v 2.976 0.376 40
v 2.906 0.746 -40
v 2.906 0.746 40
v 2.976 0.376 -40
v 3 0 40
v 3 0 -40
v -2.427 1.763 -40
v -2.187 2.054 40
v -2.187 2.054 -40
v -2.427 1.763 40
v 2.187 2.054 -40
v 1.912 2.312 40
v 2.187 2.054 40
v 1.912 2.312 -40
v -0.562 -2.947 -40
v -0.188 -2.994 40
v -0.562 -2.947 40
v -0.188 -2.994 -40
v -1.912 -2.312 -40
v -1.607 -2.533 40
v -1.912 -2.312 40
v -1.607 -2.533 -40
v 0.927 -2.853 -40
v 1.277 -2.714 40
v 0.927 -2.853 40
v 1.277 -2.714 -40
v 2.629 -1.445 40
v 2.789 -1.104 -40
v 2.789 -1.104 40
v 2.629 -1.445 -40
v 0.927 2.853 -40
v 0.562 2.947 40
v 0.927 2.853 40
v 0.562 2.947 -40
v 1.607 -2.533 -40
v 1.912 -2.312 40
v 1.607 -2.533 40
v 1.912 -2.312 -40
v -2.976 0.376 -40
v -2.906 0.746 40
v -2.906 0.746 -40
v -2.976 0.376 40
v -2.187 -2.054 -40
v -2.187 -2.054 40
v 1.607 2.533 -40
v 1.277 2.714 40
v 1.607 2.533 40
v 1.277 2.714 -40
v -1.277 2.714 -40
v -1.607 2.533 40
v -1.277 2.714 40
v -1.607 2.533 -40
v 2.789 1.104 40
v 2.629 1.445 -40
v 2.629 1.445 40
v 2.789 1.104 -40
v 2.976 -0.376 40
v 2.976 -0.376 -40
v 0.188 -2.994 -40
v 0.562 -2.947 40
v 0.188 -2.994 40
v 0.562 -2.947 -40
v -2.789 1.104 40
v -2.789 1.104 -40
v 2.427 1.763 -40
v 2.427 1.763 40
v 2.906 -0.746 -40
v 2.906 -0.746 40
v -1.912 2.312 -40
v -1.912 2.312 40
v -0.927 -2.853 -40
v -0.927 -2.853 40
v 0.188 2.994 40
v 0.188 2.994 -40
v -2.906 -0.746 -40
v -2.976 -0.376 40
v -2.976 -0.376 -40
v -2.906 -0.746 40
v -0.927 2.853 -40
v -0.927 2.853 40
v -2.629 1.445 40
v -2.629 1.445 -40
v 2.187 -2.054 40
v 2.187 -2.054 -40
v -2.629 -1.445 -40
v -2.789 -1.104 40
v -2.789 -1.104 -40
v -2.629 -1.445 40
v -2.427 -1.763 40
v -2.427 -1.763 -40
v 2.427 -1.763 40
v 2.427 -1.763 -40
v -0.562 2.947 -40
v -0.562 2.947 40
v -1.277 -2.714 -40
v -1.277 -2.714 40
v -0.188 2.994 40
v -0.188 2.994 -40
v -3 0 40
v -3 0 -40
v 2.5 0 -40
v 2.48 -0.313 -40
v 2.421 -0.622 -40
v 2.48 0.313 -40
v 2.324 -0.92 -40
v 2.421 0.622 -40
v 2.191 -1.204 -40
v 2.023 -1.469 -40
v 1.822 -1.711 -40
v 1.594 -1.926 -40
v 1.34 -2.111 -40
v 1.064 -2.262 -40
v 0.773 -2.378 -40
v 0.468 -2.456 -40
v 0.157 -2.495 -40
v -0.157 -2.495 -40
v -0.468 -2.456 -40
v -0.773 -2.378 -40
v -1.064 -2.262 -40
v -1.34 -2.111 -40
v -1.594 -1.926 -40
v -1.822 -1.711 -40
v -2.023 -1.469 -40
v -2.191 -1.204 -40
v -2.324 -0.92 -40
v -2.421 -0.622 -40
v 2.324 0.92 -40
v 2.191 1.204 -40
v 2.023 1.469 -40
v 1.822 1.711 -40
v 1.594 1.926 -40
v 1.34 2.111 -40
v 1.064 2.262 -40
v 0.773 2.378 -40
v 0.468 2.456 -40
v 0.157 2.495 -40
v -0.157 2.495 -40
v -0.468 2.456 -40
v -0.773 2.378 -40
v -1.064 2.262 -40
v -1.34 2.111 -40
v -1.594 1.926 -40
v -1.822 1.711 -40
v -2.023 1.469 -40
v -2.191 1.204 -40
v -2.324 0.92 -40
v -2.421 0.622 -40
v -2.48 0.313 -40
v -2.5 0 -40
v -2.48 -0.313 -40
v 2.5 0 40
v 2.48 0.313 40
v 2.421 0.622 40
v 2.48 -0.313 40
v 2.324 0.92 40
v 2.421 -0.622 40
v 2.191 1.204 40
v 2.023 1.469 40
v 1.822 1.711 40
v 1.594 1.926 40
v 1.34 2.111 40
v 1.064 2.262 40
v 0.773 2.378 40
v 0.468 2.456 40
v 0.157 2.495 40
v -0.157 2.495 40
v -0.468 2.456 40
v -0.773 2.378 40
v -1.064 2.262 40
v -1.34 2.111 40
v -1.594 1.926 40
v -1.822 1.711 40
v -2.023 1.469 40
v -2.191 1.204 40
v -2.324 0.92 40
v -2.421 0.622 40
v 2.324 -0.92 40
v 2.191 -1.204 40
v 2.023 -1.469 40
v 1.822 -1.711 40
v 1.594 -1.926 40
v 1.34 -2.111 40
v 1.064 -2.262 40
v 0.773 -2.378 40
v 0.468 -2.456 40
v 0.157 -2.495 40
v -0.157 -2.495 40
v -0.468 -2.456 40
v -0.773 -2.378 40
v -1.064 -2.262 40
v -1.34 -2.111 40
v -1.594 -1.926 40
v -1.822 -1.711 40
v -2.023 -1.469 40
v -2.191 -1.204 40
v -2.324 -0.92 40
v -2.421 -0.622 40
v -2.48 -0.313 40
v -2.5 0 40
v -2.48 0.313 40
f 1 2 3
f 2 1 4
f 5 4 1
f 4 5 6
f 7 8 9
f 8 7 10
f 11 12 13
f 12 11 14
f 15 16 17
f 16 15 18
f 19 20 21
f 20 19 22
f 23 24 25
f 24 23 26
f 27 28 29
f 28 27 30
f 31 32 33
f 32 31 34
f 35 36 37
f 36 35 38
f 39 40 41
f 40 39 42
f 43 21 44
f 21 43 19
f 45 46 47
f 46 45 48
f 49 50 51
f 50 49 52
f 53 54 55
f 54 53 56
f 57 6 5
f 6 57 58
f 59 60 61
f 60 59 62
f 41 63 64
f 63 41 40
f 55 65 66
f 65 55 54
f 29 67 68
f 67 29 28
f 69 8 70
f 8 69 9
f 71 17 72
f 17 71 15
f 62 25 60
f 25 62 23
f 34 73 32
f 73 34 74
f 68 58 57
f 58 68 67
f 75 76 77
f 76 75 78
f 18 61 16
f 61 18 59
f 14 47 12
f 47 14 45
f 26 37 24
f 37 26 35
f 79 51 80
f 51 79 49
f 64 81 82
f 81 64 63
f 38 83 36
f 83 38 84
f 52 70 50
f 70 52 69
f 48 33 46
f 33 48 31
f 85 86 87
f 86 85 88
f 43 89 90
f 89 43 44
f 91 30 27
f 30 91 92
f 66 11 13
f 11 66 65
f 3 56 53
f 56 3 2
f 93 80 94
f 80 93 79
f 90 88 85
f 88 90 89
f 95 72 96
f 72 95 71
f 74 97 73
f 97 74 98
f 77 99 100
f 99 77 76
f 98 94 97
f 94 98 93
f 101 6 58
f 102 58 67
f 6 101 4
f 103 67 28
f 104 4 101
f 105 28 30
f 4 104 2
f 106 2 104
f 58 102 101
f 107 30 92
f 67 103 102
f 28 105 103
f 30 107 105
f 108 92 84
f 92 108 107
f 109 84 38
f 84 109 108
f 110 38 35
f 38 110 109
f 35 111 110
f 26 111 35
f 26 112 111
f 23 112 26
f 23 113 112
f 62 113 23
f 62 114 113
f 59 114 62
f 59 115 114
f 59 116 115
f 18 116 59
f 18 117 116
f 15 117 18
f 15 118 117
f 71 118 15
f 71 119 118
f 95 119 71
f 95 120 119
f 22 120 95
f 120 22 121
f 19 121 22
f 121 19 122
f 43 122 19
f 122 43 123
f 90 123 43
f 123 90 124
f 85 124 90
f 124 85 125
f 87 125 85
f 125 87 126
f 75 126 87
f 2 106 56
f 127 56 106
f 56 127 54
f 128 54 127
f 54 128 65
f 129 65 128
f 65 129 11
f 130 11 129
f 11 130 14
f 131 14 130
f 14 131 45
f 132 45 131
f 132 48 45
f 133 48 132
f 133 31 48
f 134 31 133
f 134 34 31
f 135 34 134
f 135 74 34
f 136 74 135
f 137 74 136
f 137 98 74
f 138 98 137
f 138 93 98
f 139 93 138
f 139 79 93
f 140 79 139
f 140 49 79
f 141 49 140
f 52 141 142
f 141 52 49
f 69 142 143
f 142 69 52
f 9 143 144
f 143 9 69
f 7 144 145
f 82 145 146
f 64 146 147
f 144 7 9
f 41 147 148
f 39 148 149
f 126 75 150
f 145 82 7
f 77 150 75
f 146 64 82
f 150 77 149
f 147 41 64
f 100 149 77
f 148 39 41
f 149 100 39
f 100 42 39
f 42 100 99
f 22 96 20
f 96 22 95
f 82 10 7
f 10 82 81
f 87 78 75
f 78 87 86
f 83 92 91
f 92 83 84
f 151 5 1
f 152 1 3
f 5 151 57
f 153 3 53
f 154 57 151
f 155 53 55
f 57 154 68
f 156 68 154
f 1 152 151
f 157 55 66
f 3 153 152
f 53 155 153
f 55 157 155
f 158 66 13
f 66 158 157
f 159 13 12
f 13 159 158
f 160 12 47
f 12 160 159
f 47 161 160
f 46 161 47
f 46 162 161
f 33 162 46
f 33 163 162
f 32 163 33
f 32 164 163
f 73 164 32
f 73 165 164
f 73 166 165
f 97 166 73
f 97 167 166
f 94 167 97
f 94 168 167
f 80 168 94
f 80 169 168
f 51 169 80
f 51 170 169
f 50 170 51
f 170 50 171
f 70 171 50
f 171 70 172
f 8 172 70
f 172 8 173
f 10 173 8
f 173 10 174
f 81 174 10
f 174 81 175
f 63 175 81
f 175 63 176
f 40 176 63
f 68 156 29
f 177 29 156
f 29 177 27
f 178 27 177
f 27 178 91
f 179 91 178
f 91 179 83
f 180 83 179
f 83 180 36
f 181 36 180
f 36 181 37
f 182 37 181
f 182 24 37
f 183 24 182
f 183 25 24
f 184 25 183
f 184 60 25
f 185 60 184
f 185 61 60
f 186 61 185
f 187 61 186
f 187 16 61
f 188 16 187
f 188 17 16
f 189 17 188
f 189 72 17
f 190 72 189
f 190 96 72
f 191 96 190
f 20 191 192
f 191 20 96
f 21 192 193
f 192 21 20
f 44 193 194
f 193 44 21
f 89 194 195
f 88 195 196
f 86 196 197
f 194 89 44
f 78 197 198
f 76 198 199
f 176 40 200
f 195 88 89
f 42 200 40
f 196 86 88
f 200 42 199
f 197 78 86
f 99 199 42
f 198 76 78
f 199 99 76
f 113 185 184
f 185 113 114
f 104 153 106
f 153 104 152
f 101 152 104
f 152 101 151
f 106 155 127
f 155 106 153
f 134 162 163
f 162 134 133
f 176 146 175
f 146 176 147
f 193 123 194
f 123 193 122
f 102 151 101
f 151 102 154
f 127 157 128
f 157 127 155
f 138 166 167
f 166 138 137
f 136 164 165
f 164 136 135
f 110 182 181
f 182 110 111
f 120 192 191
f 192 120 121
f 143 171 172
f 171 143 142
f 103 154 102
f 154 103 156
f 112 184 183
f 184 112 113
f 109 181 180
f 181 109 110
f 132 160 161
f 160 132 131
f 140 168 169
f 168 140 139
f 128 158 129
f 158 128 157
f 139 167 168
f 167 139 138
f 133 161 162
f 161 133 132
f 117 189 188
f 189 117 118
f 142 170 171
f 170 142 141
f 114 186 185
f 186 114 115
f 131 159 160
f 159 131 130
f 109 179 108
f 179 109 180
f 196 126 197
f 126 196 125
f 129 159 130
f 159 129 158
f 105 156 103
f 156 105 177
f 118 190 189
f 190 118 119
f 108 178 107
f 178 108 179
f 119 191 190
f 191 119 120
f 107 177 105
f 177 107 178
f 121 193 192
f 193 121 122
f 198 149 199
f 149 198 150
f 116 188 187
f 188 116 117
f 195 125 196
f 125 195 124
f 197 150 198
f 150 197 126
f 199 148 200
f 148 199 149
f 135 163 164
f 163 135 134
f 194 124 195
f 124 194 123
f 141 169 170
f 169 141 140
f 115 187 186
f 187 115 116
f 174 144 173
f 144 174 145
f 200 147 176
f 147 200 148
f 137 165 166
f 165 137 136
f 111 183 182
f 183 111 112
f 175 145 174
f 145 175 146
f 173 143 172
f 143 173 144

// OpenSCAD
$fn = 50;


difference() {
	union() {
		translate(v = [0, 0, -40.0000000000]) {
			cylinder(h = 80, r = 3.0000000000);
		}
	}
	union() {
		translate(v = [0, 0, -100.0000000000]) {
			cylinder(h = 200, r = 2.5000000000);
		}
	}
}
